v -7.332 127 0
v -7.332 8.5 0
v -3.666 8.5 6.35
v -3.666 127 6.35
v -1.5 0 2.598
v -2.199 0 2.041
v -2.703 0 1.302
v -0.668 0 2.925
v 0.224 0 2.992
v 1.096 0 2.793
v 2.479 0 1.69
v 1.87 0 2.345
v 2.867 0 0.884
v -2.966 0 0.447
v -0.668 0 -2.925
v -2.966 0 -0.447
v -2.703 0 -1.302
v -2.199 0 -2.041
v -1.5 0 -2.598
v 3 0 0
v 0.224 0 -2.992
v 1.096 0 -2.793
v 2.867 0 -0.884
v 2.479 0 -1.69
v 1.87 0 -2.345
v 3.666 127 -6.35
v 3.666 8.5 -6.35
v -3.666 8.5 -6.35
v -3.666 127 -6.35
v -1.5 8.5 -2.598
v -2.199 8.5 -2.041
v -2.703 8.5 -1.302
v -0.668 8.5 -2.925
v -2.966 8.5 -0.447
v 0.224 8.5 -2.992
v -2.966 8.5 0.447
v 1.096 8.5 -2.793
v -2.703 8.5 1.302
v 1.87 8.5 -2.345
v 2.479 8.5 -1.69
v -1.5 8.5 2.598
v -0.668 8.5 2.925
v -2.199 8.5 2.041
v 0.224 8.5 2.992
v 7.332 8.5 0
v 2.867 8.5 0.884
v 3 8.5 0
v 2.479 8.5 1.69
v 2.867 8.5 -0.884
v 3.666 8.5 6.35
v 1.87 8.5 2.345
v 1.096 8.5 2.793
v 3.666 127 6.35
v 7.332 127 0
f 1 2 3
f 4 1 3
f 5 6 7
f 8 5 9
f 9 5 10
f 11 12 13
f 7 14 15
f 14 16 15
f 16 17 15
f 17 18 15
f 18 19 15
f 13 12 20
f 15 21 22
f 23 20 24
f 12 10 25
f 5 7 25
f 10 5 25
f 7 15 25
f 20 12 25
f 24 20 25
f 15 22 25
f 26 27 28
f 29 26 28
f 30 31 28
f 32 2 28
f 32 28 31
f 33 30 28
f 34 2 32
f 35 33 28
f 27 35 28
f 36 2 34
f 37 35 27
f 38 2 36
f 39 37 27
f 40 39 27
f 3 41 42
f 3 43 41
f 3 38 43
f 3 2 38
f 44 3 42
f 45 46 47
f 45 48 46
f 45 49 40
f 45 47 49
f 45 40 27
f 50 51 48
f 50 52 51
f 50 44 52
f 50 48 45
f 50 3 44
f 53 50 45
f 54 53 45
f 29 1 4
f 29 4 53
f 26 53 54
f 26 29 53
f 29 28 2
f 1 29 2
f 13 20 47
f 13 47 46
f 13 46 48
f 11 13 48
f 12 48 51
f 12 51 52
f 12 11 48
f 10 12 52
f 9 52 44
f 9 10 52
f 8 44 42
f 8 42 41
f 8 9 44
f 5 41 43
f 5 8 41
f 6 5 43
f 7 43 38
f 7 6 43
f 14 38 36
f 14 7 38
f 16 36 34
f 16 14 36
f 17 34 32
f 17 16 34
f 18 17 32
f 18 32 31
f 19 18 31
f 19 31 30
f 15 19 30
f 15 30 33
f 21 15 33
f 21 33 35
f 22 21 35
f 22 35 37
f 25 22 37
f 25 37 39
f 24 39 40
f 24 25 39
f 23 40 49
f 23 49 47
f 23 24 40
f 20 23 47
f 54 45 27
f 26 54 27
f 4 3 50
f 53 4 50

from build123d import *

# Parameters (mm, degrees)
BOSS_EXTRUDE1_DEPTH = 127
SKETCH3_R           = 18.31161494
SKETCH3_R_2         = 3
CUT_EXTRUDE1_DEPTH  = 8.5


with BuildPart() as part:
    # Sketch1 → Boss-Extrude1 (new body)
    with BuildSketch(Plane(origin=(0, 0, 0), x_dir=(1, 0, 0), z_dir=(0, 1, 0))):
        Polygon((7.332348419, 0), (3.666174209, 6.35), (-3.666174209, 6.35), (-7.332348419, 0), (-3.666174209, -6.35), (3.666174209, -6.35), align=None)
    extrude(amount=BOSS_EXTRUDE1_DEPTH)

    # Sketch3 → Cut-Extrude1 (cut)
    with BuildSketch(Plane.XZ):
        Circle(SKETCH3_R)
        Circle(SKETCH3_R_2, mode=Mode.SUBTRACT)
    extrude(amount=-CUT_EXTRUDE1_DEPTH, mode=Mode.SUBTRACT)


solid = part.part
